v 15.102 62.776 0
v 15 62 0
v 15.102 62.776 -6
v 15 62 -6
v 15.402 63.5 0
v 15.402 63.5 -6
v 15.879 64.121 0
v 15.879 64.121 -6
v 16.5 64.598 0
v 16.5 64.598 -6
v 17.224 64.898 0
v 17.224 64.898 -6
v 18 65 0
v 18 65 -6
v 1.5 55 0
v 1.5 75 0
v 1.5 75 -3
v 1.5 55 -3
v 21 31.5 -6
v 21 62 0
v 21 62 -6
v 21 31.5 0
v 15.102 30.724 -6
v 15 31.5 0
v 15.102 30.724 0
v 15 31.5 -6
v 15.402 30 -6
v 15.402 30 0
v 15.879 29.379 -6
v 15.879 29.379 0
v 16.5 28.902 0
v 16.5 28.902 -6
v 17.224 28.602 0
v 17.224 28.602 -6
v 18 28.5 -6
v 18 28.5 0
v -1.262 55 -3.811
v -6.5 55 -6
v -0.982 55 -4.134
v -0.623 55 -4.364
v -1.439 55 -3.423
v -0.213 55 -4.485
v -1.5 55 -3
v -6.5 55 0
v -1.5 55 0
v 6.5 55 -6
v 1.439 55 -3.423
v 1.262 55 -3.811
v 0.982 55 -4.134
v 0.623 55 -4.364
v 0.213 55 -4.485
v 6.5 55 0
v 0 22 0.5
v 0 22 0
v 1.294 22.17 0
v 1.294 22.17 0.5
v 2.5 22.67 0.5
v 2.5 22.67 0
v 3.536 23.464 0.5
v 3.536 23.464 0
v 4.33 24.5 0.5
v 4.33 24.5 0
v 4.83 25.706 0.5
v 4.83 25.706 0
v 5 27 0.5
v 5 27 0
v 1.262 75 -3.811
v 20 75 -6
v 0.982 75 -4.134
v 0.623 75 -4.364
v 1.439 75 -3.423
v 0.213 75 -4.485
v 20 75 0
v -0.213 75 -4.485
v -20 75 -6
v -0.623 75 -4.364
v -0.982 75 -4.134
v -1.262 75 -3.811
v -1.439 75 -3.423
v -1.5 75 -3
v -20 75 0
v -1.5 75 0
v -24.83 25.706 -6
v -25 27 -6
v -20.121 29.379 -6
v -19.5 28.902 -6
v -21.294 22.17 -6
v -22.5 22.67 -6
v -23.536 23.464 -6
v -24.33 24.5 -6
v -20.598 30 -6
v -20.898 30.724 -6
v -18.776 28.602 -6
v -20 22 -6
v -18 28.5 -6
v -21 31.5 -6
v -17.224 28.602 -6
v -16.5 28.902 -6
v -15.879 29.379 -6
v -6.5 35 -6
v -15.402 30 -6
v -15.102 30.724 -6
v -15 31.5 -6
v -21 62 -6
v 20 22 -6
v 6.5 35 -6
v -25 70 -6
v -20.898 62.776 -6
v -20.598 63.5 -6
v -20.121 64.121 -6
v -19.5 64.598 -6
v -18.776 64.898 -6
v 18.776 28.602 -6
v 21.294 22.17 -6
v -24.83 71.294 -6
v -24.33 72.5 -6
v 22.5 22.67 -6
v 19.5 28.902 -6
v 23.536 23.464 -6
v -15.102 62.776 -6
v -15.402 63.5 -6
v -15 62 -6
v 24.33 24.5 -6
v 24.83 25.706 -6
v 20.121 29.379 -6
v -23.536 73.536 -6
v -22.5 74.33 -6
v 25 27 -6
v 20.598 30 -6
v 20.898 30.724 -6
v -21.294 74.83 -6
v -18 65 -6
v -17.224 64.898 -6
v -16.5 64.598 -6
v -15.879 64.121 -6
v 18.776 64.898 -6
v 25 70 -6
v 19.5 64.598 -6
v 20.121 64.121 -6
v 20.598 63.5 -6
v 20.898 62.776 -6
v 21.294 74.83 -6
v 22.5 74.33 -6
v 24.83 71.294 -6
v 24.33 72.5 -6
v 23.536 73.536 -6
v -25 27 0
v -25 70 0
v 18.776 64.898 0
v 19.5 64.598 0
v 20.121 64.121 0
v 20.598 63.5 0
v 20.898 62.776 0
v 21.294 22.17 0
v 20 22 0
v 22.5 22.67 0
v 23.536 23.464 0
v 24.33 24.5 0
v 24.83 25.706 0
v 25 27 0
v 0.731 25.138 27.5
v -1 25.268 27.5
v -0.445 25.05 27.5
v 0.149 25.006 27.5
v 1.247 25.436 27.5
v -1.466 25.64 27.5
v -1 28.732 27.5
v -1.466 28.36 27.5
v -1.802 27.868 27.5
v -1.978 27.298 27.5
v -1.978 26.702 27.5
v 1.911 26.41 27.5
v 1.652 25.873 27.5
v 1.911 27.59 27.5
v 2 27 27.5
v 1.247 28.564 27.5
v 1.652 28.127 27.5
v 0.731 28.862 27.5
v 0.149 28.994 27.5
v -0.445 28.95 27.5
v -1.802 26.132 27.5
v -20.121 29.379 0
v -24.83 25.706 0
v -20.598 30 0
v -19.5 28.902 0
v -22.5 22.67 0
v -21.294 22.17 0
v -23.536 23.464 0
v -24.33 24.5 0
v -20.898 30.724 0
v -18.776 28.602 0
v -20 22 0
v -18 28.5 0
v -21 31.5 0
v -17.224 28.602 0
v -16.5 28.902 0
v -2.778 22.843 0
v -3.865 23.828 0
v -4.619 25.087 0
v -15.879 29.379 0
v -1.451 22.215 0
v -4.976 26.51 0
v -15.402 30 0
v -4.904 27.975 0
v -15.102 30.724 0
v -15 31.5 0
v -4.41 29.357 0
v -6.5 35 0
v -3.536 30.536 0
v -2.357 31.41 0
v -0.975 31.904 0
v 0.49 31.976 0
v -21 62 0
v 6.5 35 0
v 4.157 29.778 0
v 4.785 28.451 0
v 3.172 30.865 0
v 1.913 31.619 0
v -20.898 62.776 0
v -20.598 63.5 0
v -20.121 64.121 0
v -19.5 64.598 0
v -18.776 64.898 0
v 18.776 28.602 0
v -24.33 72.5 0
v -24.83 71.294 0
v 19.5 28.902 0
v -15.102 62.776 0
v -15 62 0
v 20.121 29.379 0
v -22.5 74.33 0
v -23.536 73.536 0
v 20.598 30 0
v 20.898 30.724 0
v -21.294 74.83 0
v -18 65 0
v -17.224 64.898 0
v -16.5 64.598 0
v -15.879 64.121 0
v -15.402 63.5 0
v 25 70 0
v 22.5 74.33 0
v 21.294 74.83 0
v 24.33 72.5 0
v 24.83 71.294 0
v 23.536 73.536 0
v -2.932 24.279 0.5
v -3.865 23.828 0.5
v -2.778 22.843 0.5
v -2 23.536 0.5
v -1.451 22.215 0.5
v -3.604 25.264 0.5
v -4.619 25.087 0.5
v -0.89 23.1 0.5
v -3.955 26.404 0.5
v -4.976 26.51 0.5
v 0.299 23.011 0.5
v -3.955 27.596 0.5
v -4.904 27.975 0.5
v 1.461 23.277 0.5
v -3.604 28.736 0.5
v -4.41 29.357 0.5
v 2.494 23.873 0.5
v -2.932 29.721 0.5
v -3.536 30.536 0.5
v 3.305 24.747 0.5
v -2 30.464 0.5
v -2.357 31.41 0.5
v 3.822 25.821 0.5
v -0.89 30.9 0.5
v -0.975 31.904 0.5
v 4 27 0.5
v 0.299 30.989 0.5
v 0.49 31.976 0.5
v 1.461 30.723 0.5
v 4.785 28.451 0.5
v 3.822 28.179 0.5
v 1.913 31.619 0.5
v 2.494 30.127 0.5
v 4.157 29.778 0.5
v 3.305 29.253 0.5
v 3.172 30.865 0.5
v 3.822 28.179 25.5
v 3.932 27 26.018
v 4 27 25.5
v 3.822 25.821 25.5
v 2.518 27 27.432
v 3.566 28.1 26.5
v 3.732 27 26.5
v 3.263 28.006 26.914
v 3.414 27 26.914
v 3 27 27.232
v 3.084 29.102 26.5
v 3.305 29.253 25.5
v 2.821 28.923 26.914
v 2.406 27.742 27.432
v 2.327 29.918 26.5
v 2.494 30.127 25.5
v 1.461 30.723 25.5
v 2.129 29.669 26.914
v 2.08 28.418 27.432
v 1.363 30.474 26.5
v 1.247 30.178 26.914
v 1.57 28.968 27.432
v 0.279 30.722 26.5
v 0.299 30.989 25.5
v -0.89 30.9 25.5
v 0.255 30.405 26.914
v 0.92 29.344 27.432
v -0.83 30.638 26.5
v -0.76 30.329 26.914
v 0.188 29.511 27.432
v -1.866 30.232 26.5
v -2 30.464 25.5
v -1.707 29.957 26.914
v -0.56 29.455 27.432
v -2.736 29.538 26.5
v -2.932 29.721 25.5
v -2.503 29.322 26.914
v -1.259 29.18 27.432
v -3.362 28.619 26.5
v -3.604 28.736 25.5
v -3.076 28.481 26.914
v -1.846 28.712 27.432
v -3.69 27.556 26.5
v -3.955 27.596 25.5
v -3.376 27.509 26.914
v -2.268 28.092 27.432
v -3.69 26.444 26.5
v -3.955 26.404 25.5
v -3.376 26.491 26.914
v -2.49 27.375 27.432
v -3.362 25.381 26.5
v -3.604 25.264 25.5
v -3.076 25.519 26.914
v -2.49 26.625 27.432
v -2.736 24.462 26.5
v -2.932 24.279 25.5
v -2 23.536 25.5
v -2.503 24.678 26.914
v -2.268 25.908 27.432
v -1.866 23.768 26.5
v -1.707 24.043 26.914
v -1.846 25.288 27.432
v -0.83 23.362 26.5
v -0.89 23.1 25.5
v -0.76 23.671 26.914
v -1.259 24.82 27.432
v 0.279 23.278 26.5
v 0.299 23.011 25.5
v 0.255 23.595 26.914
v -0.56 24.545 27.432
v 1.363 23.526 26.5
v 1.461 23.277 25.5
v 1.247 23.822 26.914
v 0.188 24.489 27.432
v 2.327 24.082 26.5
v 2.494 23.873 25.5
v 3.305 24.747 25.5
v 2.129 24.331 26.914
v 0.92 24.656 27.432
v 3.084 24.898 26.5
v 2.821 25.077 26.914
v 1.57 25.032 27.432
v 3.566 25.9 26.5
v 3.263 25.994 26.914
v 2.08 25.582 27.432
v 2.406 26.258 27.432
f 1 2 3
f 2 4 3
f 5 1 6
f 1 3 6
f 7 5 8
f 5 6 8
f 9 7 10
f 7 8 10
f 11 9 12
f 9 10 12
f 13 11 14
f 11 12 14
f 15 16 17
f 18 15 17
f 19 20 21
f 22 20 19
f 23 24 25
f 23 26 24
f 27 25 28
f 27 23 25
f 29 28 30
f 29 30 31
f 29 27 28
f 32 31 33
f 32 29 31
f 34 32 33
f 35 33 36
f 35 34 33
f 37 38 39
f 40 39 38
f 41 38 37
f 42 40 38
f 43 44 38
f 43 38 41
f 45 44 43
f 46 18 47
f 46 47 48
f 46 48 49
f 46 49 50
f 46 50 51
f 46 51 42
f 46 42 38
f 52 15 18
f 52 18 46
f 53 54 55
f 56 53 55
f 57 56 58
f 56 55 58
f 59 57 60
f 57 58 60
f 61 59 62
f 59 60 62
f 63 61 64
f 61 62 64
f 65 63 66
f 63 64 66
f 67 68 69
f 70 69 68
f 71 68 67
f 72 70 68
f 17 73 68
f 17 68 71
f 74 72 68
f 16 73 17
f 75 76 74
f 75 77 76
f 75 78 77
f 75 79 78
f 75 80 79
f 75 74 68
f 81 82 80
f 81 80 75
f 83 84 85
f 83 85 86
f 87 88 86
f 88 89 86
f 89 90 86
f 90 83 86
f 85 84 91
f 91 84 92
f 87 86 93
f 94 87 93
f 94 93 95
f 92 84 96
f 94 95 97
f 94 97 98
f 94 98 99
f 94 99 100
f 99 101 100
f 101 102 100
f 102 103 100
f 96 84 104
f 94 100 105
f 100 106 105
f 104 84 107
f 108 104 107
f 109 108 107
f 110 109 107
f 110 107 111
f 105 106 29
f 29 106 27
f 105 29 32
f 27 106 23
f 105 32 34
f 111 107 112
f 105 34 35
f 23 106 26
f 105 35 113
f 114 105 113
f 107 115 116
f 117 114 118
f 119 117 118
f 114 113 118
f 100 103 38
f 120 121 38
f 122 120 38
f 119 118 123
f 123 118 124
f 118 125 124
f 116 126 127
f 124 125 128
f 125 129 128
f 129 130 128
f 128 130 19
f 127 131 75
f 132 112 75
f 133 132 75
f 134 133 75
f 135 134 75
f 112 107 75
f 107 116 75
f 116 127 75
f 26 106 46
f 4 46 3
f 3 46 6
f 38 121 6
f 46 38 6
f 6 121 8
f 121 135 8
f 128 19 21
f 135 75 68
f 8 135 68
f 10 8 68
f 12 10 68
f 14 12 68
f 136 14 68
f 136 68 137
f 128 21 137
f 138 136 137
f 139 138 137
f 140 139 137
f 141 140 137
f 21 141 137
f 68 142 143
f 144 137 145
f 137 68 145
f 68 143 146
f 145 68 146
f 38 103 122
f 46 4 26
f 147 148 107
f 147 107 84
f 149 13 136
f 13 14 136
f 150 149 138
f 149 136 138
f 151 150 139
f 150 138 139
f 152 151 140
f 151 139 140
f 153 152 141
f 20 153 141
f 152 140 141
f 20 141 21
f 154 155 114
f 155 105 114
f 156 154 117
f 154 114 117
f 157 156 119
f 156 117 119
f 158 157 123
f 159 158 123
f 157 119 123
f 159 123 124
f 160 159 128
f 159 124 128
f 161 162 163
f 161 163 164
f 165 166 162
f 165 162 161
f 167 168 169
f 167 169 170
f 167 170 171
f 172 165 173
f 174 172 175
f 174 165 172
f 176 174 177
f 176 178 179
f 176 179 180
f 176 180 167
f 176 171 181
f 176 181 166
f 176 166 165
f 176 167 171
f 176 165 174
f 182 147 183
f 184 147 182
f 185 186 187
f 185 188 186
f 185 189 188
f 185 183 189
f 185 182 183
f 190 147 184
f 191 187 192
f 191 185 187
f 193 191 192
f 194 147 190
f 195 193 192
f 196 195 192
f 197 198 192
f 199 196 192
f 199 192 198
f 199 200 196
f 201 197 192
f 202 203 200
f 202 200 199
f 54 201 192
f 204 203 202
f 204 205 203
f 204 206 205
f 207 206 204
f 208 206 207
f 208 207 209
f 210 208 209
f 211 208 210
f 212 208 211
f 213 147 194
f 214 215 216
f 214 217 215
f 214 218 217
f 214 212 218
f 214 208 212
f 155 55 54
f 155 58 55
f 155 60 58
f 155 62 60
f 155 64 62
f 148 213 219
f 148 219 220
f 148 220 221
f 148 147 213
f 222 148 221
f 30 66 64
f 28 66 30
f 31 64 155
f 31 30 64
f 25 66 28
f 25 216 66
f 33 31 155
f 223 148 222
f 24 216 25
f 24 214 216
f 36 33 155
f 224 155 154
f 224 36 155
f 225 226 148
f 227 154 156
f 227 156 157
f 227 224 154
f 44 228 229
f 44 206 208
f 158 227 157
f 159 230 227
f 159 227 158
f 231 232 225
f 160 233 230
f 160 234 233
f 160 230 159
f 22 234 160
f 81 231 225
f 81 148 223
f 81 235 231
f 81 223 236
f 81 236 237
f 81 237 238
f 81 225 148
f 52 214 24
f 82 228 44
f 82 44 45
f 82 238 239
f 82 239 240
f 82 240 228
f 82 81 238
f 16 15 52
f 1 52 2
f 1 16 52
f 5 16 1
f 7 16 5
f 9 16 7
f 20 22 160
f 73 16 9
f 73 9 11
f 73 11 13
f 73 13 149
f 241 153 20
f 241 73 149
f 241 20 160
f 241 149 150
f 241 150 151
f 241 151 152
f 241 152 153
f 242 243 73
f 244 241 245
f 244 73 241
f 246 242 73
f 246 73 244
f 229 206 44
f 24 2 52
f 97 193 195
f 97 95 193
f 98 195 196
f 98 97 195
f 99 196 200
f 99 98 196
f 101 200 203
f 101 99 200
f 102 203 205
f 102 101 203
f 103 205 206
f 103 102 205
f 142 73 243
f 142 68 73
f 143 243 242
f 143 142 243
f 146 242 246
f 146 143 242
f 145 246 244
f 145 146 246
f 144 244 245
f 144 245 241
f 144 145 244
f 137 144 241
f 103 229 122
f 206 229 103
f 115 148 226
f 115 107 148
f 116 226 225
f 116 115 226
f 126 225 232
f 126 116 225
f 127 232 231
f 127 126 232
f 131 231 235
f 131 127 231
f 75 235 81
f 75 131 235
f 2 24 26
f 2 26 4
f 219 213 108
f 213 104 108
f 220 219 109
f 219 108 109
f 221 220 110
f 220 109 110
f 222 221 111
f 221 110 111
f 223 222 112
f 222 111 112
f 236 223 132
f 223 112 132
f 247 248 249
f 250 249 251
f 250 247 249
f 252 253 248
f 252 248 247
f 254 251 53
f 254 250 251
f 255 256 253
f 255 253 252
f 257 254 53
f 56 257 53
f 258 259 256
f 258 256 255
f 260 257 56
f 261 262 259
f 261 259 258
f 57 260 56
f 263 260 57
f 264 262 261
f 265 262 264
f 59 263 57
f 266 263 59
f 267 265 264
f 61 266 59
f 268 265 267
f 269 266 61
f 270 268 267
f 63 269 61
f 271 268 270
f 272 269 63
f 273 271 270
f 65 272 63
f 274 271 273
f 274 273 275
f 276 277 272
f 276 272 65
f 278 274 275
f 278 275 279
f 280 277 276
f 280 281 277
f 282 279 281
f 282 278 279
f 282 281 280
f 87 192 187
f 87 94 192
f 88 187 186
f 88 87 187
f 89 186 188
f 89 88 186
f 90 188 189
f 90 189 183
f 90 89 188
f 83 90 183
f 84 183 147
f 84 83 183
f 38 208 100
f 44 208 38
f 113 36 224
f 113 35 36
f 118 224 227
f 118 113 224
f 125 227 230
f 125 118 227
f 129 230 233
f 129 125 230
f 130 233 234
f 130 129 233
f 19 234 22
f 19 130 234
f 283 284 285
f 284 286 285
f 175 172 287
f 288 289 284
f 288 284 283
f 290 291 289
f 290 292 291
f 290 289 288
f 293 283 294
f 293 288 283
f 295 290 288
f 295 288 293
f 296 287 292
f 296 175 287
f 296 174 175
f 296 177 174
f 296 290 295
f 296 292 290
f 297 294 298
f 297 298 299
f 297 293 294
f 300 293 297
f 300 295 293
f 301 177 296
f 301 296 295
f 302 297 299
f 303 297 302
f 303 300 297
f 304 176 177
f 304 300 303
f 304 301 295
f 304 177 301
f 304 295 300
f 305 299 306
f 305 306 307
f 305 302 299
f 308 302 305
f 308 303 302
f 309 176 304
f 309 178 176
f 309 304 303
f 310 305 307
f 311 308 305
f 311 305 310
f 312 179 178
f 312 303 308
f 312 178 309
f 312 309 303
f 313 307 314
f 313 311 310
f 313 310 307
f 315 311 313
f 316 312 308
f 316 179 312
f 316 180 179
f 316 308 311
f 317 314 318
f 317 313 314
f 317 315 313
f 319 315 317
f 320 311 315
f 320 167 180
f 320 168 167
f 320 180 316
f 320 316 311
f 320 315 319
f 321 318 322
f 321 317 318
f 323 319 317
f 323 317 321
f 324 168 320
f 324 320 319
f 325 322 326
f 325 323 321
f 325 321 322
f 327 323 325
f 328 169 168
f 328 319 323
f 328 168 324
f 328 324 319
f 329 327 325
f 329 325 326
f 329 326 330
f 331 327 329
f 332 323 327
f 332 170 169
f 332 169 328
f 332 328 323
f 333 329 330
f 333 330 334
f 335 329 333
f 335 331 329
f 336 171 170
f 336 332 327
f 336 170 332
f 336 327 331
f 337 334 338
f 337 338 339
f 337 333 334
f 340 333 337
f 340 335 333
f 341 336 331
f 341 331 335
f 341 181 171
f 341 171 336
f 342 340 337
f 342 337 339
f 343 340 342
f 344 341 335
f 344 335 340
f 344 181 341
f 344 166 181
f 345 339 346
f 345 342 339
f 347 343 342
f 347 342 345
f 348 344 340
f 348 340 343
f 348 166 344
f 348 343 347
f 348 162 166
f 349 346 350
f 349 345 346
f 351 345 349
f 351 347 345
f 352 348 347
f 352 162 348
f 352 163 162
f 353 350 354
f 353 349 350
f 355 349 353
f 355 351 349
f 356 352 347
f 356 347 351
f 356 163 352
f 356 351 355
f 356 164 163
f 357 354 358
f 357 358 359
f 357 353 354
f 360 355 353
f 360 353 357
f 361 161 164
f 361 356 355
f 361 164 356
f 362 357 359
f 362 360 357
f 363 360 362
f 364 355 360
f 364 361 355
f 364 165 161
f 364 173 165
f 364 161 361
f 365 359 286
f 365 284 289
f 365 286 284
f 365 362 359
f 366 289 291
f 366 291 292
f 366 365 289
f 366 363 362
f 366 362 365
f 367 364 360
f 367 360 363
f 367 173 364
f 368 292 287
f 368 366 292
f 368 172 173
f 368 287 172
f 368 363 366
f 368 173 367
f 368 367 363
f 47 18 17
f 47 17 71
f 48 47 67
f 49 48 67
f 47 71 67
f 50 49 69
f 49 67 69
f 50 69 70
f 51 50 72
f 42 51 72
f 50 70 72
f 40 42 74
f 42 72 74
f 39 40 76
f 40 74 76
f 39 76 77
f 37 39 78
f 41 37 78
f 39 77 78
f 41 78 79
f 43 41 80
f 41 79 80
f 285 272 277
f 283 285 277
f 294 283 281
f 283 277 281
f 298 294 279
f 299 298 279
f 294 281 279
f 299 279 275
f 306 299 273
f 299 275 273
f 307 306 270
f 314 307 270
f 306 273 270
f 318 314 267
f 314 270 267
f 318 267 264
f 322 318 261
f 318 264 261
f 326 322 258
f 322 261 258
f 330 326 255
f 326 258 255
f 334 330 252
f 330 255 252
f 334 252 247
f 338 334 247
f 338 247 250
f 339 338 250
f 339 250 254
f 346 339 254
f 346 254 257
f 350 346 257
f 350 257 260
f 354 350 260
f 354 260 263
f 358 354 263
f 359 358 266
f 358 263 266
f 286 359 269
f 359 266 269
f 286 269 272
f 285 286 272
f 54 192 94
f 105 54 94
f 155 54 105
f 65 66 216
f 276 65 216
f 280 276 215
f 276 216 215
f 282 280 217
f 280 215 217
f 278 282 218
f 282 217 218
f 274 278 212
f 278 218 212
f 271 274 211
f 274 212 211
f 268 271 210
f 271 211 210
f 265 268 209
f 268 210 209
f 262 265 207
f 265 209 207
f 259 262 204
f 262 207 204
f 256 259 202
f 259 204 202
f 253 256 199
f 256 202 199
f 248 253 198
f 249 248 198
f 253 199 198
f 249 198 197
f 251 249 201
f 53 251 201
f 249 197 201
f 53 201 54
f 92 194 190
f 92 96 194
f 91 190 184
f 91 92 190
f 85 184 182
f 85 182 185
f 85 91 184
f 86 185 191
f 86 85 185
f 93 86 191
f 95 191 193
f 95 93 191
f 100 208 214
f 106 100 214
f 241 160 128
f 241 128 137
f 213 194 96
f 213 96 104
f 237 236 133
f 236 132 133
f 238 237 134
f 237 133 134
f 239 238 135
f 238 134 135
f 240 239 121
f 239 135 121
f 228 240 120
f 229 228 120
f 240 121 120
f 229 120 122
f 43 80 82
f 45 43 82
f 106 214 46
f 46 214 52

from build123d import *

# Parameters (mm, degrees)
F0_W     = 13
F0_H     = 20
F0_R     = 4
F0_W_2   = 6
F0_H_2   = 3.5
F1_DEPTH = 6
F2_DEPTH = 0.5
F3_R     = 4
F4_DEPTH = 27
F5_R     = 2
F7_DEPTH = 20
F8_R     = 5
F9_R     = 2.99999


# Not quite as in the source:
# - a fillet or chamfer is up to 0.001 mm smaller than in the source, because OpenCascade refuses the exact size


with BuildPart() as f1:
    # F0 (on Top) → F1 (new body)
    with BuildSketch(Plane.XY):
        Polygon((25, 75), (-25, 75), (-25, 22), (0, 22), (25, 22), align=None)
        Polygon((-21, 28.5), (-21, 65), (-15, 65), (-15, 28.5), (-15, 25), (-21, 25), align=None, mode=Mode.SUBTRACT)
        with BuildLine():
            ThreePointArc((5, 27), (3.5355339059, 23.4644660941), (0, 22))
            ThreePointArc((0, 22), (-3.5355339059, 30.5355339059), (5, 27))
        make_face(mode=Mode.SUBTRACT)
        with Locations((0, 45)):
            Rectangle(F0_W, F0_H, mode=Mode.SUBTRACT)
        Polygon((21, 25), (15, 25), (15, 28.5), (15, 65), (21, 65), (21, 28.5), align=None, mode=Mode.SUBTRACT)
        with BuildLine():
            ThreePointArc((5, 27), (-3.5355339059, 30.5355339059), (0, 22))
            ThreePointArc((0, 22), (3.5355339059, 23.4644660941), (5, 27))
        make_face()
        with Locations((0, 27)):
            Circle(F0_R, mode=Mode.SUBTRACT)
        with Locations((0, 27)):
            Circle(F0_R)
        with Locations((18, 26.75)):
            Rectangle(F0_W_2, F0_H_2)
        with Locations((-18, 26.75)):
            Rectangle(F0_W_2, F0_H_2)
    extrude(amount=-F1_DEPTH)

    # F0 (on Top) → F2 (join)
    with BuildSketch(Plane.XY):
        with BuildLine():
            ThreePointArc((5, 27), (-3.5355339059, 30.5355339059), (0, 22))
            ThreePointArc((0, 22), (3.5355339059, 23.4644660941), (5, 27))
        make_face()
        with Locations((0, 27)):
            Circle(F0_R, mode=Mode.SUBTRACT)
        with Locations((0, 27)):
            Circle(F0_R)
    extrude(amount=F2_DEPTH)

    # F3 (on face) → F4 (join)
    with BuildSketch(Plane.XY.offset(0.5)):
        with Locations((0, 27)):
            Circle(F3_R)
    extrude(amount=F4_DEPTH)

    # F5
    f5_edges = [f1.edges().sort_by_distance(p)[0] for p in [
        (-4, 27, 27.5),
    ]]
    fillet(f5_edges, radius=F5_R)

    # F6 (on face) → F7 (cut, through all)
    with BuildSketch(Plane(origin=(0, 75, 0), x_dir=(-1, 0, 0), z_dir=(0, 1, 0))):
        with BuildLine():
            ThreePointArc((-1.5, -3), (0, -4.5), (1.5, -3))
            ThreePointArc((1.5, -3), (0, -1.5), (-1.5, -3))
        make_face()
        with BuildLine():
            ThreePointArc((-1.5, -3), (0, -1.5), (1.5, -3))
            Line((1.5, -3), (1.5, 0))
            Line((1.5, 0), (-1.5, 0))
            Line((-1.5, 0), (-1.5, -3))
        make_face()
    extrude(amount=-F7_DEPTH, mode=Mode.SUBTRACT)

    # F8
    f8_edges = [f1.edges().sort_by_distance(p)[0] for p in [
        (25, 75, -3),
        (-25, 75, -3),
        (-25, 22, -3),
        (25, 22, -3),
    ]]
    fillet(f8_edges, radius=F8_R)

    # F9 (radius 3 in the source; OpenCascade refuses exactly that, so slightly less here)
    f9_edges = [f1.edges().sort_by_distance(p)[0] for p in [
        (-15, 28.5, -3),
        (-21, 28.5, -3),
        (21, 28.5, -3),
        (15, 28.5, -3),
        (21, 65, -3),
        (-15, 65, -3),
        (-21, 65, -3),
        (15, 65, -3),
    ]]
    fillet(f9_edges, radius=F9_R)


solid = f1.part
